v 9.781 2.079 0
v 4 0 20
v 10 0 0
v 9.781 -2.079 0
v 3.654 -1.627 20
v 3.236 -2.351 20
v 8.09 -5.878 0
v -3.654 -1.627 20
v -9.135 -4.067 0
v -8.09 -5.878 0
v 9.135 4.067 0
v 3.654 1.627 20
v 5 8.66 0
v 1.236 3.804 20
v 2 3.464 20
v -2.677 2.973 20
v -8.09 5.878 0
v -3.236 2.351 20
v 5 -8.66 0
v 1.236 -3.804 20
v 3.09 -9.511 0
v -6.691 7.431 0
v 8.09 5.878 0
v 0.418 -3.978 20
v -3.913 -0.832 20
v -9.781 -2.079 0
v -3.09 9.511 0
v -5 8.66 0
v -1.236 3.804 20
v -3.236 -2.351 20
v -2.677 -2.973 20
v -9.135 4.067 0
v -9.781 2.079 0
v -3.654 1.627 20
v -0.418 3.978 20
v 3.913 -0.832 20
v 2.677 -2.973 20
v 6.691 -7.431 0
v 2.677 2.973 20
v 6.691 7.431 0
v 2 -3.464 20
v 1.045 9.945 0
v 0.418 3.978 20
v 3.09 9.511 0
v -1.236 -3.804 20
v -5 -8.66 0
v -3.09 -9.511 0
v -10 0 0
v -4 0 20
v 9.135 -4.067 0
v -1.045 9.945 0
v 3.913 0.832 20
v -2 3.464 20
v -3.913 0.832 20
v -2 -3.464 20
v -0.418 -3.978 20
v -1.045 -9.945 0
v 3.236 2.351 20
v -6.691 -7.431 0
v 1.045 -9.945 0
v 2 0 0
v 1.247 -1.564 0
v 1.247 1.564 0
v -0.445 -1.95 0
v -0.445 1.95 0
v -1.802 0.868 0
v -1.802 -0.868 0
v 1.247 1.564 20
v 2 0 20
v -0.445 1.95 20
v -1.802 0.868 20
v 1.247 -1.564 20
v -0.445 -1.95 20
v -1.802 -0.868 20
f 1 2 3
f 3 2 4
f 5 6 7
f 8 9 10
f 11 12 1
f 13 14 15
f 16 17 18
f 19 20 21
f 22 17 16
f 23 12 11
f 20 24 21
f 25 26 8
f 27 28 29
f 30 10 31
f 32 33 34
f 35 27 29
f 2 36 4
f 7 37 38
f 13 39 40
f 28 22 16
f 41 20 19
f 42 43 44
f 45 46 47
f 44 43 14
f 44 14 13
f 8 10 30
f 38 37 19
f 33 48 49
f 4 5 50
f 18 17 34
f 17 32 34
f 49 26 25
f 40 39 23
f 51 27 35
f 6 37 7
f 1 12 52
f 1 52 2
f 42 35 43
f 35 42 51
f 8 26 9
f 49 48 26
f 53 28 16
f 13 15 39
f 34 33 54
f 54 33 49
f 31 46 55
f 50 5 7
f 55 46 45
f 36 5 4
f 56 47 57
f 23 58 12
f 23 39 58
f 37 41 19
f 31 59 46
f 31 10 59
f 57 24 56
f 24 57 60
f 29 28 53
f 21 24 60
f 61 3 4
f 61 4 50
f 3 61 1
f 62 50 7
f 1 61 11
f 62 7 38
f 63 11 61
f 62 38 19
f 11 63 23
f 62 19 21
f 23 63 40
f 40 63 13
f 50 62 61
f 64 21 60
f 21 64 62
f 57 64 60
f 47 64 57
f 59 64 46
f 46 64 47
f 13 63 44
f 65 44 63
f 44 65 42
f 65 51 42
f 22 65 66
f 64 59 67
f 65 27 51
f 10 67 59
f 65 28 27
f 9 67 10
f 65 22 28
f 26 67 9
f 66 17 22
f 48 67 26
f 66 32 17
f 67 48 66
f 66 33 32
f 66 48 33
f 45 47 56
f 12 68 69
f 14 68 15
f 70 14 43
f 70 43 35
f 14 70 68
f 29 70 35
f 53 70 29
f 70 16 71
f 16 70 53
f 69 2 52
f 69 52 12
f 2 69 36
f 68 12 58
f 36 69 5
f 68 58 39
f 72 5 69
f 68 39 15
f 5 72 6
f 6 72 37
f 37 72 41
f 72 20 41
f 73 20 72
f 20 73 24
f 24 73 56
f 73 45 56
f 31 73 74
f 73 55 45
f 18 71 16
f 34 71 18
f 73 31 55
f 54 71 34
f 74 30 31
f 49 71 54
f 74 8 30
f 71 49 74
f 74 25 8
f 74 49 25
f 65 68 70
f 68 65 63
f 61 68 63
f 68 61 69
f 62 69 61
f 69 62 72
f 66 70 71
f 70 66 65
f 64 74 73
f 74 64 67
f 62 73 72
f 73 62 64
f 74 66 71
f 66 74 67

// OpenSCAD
// cone (r1!=r2) minus a thinner bore -> tapered tube
difference() {
  cylinder(h=20, r1=10, r2=4);
  translate([0,0,-1]) cylinder(h=22, r=2);
}
